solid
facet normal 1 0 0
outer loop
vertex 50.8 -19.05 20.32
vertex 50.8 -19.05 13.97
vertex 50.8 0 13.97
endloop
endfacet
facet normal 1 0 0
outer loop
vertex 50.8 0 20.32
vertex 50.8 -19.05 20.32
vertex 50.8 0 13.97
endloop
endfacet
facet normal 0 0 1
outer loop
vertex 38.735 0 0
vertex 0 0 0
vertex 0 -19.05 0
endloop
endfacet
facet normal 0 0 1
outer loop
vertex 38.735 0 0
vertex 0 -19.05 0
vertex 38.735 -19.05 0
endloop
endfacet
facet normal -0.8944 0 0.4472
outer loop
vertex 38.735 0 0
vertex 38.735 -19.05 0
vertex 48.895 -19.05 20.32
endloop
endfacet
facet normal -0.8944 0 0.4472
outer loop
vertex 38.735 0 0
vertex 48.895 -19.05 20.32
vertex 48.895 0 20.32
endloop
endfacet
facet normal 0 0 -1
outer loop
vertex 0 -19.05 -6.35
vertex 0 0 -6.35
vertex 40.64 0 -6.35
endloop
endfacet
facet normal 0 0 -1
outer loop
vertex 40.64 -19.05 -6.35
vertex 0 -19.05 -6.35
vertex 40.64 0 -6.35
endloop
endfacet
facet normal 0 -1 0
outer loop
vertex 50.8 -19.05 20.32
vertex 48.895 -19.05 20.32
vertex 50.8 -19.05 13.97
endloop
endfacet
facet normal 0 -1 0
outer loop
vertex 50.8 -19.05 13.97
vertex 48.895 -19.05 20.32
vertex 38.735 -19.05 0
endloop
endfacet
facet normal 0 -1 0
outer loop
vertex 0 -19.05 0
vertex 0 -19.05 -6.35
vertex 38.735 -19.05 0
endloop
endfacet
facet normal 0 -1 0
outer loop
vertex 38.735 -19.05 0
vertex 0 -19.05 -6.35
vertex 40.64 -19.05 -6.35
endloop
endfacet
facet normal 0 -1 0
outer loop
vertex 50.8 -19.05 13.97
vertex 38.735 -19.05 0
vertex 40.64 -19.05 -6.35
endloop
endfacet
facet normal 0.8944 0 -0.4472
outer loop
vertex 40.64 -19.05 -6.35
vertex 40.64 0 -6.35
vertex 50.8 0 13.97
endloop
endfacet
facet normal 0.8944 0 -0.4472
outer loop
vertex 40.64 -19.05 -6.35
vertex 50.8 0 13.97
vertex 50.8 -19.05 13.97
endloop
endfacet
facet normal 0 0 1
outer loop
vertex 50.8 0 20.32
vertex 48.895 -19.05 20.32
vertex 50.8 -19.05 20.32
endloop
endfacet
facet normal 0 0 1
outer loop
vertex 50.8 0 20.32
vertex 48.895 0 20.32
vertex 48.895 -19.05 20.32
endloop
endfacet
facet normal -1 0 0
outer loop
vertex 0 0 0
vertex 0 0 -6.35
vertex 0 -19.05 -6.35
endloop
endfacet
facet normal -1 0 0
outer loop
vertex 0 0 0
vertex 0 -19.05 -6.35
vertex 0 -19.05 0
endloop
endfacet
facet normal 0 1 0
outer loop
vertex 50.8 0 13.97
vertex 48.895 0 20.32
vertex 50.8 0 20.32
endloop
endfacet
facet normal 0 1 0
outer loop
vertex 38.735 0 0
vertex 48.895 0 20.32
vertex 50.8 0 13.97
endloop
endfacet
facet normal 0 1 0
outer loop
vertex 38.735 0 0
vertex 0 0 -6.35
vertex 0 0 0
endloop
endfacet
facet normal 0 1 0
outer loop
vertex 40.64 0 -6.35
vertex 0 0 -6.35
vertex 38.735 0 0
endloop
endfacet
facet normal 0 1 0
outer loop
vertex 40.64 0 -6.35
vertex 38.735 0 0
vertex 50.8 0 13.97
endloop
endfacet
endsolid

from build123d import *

# Parameters (mm, degrees)
F0_W     = 50.8
F0_H     = 6.35
F1_DEPTH = 19.05
F2_W     = 12.065
F2_H     = 19.05
F3_DEPTH = 20.32
F4_SIZE2 = 10.16
F4_SIZE  = 20.32
F5_SIZE2 = 20.31999
F5_SIZE  = 10.15999


# Not quite as in the source:
# - a fillet or chamfer is up to 0.001 mm smaller than in the source, because OpenCascade refuses the exact size


with BuildPart() as f1:
    # F0 (on Front) → F1 (new body)
    with BuildSketch(Plane.XZ):
        with Locations((25.4, -3.175)):
            Rectangle(F0_W, F0_H)
    extrude(amount=F1_DEPTH)

    # F2 (on face) → F3 (join)
    with BuildSketch(Plane.XY):
        with Locations((44.7675, -9.525)):
            Rectangle(F2_W, F2_H)
    extrude(amount=F3_DEPTH)

    # F4
    f4_edges = [f1.edges().sort_by_distance(p)[0] for p in [
        (50.8, -9.525, -6.35),
    ]]
    f4_side = f1.faces().sort_by_distance((50.8, -9.525, 6.985))[0]
    chamfer(f4_edges, length=F4_SIZE, length2=F4_SIZE2, reference=f4_side)

    # F5 (size 10.16 and 20.32 in the source; OpenCascade refuses exactly that, so slightly less here)
    f5_edges = [f1.edges().sort_by_distance(p)[0] for p in [
        (38.735, -9.525, 20.32),
    ]]
    f5_side = f1.faces().sort_by_distance((44.7675, -9.525, 20.32))[0]
    chamfer(f5_edges, length=F5_SIZE, length2=F5_SIZE2, reference=f5_side)


solid = f1.part
